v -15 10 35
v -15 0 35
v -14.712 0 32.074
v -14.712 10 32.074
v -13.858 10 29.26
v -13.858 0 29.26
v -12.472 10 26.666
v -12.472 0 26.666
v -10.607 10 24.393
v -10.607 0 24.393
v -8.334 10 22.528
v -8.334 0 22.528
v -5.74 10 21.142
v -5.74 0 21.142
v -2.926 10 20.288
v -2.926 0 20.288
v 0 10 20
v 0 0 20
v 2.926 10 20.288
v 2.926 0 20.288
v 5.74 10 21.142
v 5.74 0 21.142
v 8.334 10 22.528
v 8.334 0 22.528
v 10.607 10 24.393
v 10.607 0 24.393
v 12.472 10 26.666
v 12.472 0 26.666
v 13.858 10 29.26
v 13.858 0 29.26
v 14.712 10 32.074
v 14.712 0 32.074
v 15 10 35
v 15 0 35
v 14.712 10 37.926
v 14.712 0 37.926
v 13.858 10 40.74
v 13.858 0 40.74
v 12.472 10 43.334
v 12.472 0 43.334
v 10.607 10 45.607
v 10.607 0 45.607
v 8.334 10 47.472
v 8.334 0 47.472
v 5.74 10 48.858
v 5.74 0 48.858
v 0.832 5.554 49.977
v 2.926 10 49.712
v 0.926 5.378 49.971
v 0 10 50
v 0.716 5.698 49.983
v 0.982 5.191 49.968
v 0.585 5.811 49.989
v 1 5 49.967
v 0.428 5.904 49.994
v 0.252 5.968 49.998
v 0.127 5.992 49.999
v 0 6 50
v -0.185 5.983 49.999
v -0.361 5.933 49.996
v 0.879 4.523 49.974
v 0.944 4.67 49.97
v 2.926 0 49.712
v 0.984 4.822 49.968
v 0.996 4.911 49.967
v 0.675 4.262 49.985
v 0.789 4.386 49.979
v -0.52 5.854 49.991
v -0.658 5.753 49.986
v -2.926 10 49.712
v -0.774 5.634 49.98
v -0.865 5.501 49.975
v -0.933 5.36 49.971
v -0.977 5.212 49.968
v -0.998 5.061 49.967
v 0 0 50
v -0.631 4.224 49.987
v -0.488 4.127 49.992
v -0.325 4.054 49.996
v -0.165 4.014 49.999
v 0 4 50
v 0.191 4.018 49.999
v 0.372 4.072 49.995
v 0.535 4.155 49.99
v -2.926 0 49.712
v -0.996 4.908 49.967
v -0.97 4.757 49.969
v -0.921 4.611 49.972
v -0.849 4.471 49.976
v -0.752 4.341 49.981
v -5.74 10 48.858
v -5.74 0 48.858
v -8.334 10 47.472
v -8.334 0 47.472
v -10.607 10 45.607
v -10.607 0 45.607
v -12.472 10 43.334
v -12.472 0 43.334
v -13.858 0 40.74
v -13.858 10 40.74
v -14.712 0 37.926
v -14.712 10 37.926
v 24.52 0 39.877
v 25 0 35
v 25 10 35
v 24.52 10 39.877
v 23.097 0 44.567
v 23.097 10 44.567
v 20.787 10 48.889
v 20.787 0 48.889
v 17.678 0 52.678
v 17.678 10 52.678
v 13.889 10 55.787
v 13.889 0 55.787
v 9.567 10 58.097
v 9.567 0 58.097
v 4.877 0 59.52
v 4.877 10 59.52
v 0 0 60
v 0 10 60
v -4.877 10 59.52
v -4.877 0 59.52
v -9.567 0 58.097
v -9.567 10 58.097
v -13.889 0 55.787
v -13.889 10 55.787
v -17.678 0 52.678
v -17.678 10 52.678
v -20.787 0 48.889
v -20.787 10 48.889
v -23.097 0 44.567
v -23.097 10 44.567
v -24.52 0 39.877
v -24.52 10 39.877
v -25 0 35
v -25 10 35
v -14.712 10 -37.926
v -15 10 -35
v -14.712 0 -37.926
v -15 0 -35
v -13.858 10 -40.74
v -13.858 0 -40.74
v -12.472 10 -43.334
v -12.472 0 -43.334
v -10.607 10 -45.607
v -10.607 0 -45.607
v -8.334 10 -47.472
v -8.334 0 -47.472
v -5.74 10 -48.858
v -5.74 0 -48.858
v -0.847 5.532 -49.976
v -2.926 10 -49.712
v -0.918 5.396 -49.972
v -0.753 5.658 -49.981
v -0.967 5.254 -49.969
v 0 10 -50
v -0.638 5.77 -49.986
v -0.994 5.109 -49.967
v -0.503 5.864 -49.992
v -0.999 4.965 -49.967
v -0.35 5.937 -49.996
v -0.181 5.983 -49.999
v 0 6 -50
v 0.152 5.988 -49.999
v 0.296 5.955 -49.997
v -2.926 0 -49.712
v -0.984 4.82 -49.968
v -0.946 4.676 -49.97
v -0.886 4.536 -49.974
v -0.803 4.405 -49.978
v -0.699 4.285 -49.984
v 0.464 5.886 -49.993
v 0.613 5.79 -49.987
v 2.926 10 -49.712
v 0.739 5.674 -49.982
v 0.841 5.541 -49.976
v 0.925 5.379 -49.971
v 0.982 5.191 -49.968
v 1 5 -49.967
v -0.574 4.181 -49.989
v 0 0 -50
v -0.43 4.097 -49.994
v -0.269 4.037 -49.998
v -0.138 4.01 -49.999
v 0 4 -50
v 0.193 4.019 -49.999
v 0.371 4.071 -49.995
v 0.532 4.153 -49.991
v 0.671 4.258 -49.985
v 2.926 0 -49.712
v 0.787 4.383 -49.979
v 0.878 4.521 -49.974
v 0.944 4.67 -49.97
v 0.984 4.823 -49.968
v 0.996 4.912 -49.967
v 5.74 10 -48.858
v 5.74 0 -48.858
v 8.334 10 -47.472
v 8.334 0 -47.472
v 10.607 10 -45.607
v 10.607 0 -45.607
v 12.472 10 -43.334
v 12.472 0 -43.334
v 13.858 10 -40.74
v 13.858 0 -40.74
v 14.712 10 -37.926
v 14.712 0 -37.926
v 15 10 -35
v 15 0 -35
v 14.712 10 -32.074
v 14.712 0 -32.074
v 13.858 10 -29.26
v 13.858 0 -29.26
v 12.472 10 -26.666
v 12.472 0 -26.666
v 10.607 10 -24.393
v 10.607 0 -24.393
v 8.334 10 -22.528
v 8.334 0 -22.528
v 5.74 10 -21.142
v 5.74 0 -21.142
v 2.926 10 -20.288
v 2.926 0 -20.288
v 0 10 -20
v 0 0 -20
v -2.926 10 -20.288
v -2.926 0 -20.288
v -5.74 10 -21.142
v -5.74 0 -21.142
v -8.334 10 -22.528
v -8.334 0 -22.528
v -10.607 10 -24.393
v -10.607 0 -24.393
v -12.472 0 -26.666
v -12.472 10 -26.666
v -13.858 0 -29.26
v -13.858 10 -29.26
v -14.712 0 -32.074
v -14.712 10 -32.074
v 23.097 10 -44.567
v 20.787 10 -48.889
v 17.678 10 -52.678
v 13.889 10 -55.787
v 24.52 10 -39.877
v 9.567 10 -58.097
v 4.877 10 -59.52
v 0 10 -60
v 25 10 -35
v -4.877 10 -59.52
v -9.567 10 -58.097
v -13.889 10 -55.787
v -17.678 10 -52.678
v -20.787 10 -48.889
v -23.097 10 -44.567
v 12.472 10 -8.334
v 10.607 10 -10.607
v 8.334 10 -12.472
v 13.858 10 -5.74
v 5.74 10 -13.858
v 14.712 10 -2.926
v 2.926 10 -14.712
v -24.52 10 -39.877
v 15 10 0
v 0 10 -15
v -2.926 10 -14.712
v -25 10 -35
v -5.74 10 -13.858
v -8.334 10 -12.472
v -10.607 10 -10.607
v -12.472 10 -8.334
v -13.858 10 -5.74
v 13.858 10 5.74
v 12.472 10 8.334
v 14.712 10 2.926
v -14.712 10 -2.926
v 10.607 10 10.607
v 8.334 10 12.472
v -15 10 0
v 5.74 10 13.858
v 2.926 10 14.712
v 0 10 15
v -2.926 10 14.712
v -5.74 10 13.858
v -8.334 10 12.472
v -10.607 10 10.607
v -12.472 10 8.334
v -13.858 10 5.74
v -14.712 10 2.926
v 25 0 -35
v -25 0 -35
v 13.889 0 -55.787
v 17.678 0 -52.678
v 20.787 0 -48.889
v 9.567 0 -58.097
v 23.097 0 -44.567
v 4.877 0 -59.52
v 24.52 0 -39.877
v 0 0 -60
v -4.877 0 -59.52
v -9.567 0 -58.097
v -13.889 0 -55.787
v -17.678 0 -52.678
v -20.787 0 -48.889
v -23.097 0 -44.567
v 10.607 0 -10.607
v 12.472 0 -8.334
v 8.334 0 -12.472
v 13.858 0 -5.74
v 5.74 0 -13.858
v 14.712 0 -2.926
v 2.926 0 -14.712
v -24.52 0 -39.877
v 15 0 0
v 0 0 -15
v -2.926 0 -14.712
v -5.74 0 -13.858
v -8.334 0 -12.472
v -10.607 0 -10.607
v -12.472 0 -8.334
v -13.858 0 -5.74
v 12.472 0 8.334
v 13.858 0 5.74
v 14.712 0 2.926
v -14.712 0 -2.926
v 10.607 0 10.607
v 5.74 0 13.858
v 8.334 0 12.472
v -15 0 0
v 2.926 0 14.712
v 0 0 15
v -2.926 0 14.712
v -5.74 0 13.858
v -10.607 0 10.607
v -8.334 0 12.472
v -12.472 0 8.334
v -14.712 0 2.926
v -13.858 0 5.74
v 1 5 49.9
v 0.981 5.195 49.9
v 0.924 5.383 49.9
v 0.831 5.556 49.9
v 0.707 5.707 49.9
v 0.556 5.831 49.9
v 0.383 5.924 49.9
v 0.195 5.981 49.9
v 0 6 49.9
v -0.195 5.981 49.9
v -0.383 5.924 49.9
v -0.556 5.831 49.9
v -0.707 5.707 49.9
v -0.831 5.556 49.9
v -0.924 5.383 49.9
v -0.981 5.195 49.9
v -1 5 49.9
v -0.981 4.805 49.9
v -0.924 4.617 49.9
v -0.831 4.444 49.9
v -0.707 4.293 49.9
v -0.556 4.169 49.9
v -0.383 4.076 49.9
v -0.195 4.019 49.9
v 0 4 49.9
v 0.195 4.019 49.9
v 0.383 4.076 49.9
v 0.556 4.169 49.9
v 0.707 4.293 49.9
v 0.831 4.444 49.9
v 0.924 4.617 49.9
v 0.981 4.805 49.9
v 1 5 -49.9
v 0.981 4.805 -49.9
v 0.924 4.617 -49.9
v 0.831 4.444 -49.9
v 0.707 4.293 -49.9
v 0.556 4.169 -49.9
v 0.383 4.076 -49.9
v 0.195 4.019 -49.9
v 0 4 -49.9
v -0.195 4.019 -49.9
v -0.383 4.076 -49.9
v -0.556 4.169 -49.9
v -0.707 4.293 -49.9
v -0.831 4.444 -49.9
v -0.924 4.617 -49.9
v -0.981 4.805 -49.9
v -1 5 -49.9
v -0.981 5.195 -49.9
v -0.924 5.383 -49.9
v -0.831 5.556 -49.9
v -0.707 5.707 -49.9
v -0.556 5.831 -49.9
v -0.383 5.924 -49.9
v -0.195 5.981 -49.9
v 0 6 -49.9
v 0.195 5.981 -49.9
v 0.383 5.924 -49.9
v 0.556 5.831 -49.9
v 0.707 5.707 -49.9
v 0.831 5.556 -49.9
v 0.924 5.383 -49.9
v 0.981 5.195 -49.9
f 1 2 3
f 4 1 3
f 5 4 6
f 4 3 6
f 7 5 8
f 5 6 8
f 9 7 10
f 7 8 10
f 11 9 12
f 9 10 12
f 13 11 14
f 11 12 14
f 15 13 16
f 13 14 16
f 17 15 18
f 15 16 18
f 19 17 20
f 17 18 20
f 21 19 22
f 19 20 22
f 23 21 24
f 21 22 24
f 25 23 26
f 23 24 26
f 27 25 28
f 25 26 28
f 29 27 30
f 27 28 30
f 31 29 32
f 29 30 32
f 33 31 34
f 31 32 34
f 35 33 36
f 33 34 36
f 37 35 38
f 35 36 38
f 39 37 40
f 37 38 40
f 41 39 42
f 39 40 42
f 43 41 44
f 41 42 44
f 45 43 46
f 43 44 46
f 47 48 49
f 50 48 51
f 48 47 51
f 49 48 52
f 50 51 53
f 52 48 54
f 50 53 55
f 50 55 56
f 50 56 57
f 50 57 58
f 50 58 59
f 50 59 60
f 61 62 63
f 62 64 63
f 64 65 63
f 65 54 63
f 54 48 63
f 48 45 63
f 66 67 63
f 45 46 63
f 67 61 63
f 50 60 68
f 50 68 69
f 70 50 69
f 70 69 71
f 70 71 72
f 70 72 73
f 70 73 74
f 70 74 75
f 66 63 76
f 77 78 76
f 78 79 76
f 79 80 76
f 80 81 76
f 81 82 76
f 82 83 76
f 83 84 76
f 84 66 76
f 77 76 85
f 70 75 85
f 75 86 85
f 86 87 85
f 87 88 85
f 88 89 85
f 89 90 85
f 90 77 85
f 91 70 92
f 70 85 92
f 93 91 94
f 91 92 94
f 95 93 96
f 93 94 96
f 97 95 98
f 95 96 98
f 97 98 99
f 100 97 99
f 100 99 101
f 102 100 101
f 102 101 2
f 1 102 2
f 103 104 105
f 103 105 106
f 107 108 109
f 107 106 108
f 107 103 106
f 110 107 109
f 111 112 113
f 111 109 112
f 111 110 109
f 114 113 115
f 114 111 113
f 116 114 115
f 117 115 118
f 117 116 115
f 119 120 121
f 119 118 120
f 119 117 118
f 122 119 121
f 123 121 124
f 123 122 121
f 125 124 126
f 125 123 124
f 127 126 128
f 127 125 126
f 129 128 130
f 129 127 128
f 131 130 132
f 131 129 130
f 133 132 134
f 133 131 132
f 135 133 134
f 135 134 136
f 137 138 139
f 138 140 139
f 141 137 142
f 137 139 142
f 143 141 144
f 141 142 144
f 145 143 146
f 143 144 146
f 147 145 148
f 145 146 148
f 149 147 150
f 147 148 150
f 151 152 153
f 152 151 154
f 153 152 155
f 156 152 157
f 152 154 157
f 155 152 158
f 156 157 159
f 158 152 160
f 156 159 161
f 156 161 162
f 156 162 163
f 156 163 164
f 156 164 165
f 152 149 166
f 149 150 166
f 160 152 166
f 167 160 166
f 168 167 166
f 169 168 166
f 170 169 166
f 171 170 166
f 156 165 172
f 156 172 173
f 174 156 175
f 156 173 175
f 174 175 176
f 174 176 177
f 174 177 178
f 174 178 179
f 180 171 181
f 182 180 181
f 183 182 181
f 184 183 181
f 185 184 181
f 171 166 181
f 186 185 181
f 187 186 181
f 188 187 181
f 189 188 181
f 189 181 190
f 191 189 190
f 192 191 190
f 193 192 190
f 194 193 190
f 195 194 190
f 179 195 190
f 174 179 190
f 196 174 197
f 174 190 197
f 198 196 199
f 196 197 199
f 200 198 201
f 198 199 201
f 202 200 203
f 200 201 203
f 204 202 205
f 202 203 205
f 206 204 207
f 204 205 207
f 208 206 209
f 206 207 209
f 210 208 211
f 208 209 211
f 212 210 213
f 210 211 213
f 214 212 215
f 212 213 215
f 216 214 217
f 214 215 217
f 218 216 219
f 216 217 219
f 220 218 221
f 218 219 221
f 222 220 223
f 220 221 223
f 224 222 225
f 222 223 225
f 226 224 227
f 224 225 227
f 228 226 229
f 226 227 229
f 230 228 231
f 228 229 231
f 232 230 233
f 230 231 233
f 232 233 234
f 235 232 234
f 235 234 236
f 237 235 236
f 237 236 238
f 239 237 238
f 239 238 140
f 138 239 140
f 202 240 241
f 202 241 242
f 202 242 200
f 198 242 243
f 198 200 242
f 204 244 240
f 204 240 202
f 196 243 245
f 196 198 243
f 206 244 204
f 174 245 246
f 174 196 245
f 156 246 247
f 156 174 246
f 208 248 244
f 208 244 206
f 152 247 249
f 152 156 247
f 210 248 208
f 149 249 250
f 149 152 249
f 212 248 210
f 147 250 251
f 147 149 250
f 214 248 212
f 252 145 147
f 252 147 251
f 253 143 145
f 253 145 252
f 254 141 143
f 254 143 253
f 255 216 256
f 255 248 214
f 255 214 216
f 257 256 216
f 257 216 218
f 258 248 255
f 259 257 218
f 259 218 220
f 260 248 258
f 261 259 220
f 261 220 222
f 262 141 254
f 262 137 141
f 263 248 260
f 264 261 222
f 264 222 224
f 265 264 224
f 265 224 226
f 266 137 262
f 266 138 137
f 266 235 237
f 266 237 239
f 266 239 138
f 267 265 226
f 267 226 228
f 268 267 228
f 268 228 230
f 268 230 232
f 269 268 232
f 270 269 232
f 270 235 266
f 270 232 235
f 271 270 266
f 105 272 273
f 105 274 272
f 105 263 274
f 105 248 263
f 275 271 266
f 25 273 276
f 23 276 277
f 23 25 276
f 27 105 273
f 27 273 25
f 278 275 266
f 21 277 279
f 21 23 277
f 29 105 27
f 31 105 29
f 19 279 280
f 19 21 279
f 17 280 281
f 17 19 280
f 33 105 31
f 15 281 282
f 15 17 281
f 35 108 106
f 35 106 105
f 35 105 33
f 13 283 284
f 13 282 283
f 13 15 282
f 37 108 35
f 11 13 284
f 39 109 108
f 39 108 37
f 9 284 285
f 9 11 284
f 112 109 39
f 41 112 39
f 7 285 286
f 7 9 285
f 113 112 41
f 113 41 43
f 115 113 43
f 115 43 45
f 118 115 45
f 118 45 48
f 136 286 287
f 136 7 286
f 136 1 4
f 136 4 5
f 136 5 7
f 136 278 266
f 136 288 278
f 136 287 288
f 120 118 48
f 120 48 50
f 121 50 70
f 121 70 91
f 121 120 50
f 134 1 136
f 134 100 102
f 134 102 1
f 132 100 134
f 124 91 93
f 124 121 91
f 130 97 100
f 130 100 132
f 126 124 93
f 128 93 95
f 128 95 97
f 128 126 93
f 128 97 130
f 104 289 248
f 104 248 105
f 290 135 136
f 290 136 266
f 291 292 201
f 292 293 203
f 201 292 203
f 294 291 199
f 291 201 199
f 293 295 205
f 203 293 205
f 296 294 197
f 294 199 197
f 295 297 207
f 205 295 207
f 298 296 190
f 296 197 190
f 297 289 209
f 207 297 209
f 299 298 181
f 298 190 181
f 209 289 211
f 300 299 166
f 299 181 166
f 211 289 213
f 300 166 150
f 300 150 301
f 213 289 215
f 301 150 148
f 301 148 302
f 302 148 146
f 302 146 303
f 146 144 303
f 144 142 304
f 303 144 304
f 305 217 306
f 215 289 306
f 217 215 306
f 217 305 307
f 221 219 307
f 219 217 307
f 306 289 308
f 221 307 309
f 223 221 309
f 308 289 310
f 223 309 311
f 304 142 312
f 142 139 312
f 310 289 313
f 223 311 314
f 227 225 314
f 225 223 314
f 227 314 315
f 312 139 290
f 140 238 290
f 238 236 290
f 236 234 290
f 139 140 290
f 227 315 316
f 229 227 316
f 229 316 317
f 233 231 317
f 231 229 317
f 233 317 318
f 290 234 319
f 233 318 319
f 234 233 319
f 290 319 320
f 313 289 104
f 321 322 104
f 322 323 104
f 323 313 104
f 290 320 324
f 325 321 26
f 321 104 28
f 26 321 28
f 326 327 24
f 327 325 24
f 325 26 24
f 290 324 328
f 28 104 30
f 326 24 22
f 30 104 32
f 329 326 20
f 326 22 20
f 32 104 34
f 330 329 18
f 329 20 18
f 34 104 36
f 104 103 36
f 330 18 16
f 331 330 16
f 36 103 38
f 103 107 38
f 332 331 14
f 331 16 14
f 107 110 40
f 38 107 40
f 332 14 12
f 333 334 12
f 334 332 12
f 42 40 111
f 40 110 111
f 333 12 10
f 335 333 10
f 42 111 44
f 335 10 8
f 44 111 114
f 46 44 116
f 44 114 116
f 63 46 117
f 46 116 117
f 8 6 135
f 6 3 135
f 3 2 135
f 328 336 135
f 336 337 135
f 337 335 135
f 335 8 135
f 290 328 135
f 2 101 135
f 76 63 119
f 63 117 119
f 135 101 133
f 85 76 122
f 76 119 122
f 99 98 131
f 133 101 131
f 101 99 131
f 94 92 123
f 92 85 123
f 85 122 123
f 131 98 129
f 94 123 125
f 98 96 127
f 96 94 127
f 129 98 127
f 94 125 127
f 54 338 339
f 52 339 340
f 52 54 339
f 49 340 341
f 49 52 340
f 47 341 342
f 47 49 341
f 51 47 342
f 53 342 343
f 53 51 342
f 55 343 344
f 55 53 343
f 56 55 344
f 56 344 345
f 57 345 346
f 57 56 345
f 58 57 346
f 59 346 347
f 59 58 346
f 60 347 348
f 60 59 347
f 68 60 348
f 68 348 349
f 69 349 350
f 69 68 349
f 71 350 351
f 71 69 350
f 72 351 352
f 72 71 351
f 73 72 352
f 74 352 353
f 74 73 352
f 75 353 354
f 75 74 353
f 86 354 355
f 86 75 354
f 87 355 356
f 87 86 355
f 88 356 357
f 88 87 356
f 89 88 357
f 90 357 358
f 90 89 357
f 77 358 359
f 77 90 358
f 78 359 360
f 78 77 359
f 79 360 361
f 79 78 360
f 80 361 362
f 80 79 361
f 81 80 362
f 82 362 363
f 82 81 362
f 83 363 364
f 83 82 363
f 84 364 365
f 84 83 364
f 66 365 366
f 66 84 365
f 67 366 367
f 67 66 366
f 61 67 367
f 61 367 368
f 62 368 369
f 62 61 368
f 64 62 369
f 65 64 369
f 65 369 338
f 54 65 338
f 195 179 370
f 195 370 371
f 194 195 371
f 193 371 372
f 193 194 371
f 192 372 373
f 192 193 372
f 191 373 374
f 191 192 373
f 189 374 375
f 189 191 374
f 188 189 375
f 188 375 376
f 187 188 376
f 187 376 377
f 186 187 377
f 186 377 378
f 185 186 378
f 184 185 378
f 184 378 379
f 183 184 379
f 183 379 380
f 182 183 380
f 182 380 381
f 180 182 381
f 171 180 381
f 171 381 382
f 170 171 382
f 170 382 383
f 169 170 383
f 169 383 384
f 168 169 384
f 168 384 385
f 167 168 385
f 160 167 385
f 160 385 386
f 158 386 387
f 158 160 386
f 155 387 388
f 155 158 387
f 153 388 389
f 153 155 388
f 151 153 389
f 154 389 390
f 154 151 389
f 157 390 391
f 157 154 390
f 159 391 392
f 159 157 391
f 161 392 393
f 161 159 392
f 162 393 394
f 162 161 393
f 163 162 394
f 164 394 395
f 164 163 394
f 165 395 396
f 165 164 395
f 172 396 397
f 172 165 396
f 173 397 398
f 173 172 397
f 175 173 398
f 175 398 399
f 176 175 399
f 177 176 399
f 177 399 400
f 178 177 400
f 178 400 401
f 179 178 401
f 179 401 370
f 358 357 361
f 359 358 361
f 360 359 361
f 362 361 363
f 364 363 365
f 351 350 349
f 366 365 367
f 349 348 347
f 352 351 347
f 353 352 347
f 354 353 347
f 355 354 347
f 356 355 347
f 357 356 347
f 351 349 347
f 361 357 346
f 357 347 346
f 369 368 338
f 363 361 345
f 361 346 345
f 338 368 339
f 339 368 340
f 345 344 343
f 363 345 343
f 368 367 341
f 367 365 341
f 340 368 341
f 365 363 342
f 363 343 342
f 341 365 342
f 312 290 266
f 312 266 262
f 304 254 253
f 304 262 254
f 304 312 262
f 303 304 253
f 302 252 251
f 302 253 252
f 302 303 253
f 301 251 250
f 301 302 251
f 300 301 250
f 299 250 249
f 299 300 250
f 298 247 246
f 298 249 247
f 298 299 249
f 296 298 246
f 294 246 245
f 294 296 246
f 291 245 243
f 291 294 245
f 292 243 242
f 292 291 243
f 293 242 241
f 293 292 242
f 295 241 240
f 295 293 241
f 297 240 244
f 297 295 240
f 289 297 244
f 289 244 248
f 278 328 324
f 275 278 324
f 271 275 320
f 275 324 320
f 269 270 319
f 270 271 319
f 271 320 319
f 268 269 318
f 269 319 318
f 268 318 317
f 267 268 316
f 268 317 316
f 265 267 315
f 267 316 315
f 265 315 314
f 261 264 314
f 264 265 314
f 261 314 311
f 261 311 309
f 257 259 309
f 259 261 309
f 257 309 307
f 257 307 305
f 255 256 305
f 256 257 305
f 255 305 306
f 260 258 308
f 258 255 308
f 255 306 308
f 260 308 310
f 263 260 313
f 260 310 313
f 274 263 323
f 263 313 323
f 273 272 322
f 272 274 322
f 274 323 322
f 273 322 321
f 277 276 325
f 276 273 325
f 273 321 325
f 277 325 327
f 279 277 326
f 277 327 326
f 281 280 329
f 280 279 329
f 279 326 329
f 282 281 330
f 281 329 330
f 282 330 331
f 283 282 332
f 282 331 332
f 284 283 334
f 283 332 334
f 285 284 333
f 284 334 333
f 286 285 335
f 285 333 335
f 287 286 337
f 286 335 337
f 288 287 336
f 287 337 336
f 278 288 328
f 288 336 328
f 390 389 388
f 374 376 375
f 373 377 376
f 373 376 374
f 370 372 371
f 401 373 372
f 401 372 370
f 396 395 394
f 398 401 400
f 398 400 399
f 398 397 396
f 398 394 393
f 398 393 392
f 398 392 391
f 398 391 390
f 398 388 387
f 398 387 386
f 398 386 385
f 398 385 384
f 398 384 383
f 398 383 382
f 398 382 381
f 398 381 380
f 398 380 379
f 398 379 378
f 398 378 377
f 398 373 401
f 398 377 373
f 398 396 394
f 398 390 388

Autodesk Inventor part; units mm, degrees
sketch "Boceto1" plane through (0, 0, 0) normal (0, 1, 0) x (-1, 0, 0)
  line L0 (0, 35) -> (0, -35) construction
  line L1 (25, 35) -> (25, -35)
  line L2 (-25, -35) -> (-25, 35)
  arc A0 (25, 35) -> (-25, 35) centre (0, 35) ccw
  arc A1 (-25, -35) -> (25, -35) centre (0, -35) ccw
  circle A2 centre (0, -35) radius 15
  circle A3 centre (0, 35) radius 15
  line L3 (0, -20) -> (0, -20)
  line L4 (15, -35) -> (-15, -35)
  line L5 (94.5074, 0) -> (-76.0102, 0) construction
  line L6 (15, 35) -> (-15, 35)
  line L7 (15, -35) -> (-15, -35)
  circle A4 centre (0, 0) radius 15
  point P0 (0, 60)
  point P1 (0, -60)
  point P2 (0, -20)
  point P3 (15, 35)
  dimension "largo" = 120
  dimension "ancho" = 50
  dimension "espesor_junta" = 10
  dimension "d3" = 10
  dimension "d6" = 0
  dimension "d12" = 30
extrude "Extrusión3" add sketch "Boceto1" along normal blind 10
ref_plane "Plano de trabajo1" through (0, 0, 35) normal (1, 0, 0) x (0, 0, -1)
sketch "Boceto2" plane through (0, 0, 35) normal (1, 0, 0) x (0, 0, -1)
  line L0 (15, 0) -> (15, 10) projected
  line L1 (15, 10) -> (20, 10) projected
  line L2 (20, 10) -> (20, 0) projected
  line L3 (20, 0) -> (15, 0) projected
  line L4 (55, 10) -> (55, 0) projected
  line L5 (55, 0) -> (50, 0) projected
  line L6 (50, 0) -> (50, 10) projected
  line L7 (50, 10) -> (55, 10) projected
  line L8 (95, 10) -> (95, 0) projected
  line L9 (95, 0) -> (85, 0) projected
  line L10 (85, 0) -> (85, 10) projected
  line L11 (85, 10) -> (95, 10) projected
  line L12 (-25, 0) -> (-25, 10) projected
  line L13 (-25, 10) -> (-15, 10) projected
  line L14 (-15, 10) -> (-15, 0) projected
  line L15 (-15, 0) -> (-25, 0) projected
  line L16 (-15, 10) -> (-15, 0) projected
  point P0 (35, 0)
  point P1 (85, 5)
  point P2 (-15, 5)
ref_plane "Plano de trabajo2" through (0, 5, -50) normal (0, 0, 1) x (1, 0, 0)
ref_plane "Plano de trabajo3" through (0, 10, 50) normal (0, 0, 1) x (1, 0, 0)
sketch "Boceto3" plane through (0, 5, -50) normal (0, 0, 1) x (1, 0, 0)
  circle A0 centre (0, 0) radius 1
  point P0 (0, -5)
  dimension "d16" = 2
extrude "Extrusión4" add sketch "Boceto3" along normal blind 0.1
sketch "Boceto4" plane through (0, 10, 50) normal (0, 0, 1) x (1, 0, 0)
  line L0 (-20, -10) -> (-20, 0) projected
  line L1 (-20, 0) -> (0, 0) projected
  line L2 (0, 0) -> (0, -10) projected
  line L3 (20, -10) -> (0, -10) projected
  line L4 (20, 0) -> (20, -10) projected
  line L5 (0, 0) -> (20, 0) projected
  line L6 (0, -10) -> (-20, -10) projected
  circle A0 centre (0, -5) radius 1
  dimension "d19" = 2
extrude "Extrusión5" add sketch "Boceto4" against normal blind 0.1 contours A0 L2 | L2 A0
equation "\"d3\" = espesor_junta"
equation "\"d15\" = -0.5 * ancho"
properties part number "mod3_3DPrint"
